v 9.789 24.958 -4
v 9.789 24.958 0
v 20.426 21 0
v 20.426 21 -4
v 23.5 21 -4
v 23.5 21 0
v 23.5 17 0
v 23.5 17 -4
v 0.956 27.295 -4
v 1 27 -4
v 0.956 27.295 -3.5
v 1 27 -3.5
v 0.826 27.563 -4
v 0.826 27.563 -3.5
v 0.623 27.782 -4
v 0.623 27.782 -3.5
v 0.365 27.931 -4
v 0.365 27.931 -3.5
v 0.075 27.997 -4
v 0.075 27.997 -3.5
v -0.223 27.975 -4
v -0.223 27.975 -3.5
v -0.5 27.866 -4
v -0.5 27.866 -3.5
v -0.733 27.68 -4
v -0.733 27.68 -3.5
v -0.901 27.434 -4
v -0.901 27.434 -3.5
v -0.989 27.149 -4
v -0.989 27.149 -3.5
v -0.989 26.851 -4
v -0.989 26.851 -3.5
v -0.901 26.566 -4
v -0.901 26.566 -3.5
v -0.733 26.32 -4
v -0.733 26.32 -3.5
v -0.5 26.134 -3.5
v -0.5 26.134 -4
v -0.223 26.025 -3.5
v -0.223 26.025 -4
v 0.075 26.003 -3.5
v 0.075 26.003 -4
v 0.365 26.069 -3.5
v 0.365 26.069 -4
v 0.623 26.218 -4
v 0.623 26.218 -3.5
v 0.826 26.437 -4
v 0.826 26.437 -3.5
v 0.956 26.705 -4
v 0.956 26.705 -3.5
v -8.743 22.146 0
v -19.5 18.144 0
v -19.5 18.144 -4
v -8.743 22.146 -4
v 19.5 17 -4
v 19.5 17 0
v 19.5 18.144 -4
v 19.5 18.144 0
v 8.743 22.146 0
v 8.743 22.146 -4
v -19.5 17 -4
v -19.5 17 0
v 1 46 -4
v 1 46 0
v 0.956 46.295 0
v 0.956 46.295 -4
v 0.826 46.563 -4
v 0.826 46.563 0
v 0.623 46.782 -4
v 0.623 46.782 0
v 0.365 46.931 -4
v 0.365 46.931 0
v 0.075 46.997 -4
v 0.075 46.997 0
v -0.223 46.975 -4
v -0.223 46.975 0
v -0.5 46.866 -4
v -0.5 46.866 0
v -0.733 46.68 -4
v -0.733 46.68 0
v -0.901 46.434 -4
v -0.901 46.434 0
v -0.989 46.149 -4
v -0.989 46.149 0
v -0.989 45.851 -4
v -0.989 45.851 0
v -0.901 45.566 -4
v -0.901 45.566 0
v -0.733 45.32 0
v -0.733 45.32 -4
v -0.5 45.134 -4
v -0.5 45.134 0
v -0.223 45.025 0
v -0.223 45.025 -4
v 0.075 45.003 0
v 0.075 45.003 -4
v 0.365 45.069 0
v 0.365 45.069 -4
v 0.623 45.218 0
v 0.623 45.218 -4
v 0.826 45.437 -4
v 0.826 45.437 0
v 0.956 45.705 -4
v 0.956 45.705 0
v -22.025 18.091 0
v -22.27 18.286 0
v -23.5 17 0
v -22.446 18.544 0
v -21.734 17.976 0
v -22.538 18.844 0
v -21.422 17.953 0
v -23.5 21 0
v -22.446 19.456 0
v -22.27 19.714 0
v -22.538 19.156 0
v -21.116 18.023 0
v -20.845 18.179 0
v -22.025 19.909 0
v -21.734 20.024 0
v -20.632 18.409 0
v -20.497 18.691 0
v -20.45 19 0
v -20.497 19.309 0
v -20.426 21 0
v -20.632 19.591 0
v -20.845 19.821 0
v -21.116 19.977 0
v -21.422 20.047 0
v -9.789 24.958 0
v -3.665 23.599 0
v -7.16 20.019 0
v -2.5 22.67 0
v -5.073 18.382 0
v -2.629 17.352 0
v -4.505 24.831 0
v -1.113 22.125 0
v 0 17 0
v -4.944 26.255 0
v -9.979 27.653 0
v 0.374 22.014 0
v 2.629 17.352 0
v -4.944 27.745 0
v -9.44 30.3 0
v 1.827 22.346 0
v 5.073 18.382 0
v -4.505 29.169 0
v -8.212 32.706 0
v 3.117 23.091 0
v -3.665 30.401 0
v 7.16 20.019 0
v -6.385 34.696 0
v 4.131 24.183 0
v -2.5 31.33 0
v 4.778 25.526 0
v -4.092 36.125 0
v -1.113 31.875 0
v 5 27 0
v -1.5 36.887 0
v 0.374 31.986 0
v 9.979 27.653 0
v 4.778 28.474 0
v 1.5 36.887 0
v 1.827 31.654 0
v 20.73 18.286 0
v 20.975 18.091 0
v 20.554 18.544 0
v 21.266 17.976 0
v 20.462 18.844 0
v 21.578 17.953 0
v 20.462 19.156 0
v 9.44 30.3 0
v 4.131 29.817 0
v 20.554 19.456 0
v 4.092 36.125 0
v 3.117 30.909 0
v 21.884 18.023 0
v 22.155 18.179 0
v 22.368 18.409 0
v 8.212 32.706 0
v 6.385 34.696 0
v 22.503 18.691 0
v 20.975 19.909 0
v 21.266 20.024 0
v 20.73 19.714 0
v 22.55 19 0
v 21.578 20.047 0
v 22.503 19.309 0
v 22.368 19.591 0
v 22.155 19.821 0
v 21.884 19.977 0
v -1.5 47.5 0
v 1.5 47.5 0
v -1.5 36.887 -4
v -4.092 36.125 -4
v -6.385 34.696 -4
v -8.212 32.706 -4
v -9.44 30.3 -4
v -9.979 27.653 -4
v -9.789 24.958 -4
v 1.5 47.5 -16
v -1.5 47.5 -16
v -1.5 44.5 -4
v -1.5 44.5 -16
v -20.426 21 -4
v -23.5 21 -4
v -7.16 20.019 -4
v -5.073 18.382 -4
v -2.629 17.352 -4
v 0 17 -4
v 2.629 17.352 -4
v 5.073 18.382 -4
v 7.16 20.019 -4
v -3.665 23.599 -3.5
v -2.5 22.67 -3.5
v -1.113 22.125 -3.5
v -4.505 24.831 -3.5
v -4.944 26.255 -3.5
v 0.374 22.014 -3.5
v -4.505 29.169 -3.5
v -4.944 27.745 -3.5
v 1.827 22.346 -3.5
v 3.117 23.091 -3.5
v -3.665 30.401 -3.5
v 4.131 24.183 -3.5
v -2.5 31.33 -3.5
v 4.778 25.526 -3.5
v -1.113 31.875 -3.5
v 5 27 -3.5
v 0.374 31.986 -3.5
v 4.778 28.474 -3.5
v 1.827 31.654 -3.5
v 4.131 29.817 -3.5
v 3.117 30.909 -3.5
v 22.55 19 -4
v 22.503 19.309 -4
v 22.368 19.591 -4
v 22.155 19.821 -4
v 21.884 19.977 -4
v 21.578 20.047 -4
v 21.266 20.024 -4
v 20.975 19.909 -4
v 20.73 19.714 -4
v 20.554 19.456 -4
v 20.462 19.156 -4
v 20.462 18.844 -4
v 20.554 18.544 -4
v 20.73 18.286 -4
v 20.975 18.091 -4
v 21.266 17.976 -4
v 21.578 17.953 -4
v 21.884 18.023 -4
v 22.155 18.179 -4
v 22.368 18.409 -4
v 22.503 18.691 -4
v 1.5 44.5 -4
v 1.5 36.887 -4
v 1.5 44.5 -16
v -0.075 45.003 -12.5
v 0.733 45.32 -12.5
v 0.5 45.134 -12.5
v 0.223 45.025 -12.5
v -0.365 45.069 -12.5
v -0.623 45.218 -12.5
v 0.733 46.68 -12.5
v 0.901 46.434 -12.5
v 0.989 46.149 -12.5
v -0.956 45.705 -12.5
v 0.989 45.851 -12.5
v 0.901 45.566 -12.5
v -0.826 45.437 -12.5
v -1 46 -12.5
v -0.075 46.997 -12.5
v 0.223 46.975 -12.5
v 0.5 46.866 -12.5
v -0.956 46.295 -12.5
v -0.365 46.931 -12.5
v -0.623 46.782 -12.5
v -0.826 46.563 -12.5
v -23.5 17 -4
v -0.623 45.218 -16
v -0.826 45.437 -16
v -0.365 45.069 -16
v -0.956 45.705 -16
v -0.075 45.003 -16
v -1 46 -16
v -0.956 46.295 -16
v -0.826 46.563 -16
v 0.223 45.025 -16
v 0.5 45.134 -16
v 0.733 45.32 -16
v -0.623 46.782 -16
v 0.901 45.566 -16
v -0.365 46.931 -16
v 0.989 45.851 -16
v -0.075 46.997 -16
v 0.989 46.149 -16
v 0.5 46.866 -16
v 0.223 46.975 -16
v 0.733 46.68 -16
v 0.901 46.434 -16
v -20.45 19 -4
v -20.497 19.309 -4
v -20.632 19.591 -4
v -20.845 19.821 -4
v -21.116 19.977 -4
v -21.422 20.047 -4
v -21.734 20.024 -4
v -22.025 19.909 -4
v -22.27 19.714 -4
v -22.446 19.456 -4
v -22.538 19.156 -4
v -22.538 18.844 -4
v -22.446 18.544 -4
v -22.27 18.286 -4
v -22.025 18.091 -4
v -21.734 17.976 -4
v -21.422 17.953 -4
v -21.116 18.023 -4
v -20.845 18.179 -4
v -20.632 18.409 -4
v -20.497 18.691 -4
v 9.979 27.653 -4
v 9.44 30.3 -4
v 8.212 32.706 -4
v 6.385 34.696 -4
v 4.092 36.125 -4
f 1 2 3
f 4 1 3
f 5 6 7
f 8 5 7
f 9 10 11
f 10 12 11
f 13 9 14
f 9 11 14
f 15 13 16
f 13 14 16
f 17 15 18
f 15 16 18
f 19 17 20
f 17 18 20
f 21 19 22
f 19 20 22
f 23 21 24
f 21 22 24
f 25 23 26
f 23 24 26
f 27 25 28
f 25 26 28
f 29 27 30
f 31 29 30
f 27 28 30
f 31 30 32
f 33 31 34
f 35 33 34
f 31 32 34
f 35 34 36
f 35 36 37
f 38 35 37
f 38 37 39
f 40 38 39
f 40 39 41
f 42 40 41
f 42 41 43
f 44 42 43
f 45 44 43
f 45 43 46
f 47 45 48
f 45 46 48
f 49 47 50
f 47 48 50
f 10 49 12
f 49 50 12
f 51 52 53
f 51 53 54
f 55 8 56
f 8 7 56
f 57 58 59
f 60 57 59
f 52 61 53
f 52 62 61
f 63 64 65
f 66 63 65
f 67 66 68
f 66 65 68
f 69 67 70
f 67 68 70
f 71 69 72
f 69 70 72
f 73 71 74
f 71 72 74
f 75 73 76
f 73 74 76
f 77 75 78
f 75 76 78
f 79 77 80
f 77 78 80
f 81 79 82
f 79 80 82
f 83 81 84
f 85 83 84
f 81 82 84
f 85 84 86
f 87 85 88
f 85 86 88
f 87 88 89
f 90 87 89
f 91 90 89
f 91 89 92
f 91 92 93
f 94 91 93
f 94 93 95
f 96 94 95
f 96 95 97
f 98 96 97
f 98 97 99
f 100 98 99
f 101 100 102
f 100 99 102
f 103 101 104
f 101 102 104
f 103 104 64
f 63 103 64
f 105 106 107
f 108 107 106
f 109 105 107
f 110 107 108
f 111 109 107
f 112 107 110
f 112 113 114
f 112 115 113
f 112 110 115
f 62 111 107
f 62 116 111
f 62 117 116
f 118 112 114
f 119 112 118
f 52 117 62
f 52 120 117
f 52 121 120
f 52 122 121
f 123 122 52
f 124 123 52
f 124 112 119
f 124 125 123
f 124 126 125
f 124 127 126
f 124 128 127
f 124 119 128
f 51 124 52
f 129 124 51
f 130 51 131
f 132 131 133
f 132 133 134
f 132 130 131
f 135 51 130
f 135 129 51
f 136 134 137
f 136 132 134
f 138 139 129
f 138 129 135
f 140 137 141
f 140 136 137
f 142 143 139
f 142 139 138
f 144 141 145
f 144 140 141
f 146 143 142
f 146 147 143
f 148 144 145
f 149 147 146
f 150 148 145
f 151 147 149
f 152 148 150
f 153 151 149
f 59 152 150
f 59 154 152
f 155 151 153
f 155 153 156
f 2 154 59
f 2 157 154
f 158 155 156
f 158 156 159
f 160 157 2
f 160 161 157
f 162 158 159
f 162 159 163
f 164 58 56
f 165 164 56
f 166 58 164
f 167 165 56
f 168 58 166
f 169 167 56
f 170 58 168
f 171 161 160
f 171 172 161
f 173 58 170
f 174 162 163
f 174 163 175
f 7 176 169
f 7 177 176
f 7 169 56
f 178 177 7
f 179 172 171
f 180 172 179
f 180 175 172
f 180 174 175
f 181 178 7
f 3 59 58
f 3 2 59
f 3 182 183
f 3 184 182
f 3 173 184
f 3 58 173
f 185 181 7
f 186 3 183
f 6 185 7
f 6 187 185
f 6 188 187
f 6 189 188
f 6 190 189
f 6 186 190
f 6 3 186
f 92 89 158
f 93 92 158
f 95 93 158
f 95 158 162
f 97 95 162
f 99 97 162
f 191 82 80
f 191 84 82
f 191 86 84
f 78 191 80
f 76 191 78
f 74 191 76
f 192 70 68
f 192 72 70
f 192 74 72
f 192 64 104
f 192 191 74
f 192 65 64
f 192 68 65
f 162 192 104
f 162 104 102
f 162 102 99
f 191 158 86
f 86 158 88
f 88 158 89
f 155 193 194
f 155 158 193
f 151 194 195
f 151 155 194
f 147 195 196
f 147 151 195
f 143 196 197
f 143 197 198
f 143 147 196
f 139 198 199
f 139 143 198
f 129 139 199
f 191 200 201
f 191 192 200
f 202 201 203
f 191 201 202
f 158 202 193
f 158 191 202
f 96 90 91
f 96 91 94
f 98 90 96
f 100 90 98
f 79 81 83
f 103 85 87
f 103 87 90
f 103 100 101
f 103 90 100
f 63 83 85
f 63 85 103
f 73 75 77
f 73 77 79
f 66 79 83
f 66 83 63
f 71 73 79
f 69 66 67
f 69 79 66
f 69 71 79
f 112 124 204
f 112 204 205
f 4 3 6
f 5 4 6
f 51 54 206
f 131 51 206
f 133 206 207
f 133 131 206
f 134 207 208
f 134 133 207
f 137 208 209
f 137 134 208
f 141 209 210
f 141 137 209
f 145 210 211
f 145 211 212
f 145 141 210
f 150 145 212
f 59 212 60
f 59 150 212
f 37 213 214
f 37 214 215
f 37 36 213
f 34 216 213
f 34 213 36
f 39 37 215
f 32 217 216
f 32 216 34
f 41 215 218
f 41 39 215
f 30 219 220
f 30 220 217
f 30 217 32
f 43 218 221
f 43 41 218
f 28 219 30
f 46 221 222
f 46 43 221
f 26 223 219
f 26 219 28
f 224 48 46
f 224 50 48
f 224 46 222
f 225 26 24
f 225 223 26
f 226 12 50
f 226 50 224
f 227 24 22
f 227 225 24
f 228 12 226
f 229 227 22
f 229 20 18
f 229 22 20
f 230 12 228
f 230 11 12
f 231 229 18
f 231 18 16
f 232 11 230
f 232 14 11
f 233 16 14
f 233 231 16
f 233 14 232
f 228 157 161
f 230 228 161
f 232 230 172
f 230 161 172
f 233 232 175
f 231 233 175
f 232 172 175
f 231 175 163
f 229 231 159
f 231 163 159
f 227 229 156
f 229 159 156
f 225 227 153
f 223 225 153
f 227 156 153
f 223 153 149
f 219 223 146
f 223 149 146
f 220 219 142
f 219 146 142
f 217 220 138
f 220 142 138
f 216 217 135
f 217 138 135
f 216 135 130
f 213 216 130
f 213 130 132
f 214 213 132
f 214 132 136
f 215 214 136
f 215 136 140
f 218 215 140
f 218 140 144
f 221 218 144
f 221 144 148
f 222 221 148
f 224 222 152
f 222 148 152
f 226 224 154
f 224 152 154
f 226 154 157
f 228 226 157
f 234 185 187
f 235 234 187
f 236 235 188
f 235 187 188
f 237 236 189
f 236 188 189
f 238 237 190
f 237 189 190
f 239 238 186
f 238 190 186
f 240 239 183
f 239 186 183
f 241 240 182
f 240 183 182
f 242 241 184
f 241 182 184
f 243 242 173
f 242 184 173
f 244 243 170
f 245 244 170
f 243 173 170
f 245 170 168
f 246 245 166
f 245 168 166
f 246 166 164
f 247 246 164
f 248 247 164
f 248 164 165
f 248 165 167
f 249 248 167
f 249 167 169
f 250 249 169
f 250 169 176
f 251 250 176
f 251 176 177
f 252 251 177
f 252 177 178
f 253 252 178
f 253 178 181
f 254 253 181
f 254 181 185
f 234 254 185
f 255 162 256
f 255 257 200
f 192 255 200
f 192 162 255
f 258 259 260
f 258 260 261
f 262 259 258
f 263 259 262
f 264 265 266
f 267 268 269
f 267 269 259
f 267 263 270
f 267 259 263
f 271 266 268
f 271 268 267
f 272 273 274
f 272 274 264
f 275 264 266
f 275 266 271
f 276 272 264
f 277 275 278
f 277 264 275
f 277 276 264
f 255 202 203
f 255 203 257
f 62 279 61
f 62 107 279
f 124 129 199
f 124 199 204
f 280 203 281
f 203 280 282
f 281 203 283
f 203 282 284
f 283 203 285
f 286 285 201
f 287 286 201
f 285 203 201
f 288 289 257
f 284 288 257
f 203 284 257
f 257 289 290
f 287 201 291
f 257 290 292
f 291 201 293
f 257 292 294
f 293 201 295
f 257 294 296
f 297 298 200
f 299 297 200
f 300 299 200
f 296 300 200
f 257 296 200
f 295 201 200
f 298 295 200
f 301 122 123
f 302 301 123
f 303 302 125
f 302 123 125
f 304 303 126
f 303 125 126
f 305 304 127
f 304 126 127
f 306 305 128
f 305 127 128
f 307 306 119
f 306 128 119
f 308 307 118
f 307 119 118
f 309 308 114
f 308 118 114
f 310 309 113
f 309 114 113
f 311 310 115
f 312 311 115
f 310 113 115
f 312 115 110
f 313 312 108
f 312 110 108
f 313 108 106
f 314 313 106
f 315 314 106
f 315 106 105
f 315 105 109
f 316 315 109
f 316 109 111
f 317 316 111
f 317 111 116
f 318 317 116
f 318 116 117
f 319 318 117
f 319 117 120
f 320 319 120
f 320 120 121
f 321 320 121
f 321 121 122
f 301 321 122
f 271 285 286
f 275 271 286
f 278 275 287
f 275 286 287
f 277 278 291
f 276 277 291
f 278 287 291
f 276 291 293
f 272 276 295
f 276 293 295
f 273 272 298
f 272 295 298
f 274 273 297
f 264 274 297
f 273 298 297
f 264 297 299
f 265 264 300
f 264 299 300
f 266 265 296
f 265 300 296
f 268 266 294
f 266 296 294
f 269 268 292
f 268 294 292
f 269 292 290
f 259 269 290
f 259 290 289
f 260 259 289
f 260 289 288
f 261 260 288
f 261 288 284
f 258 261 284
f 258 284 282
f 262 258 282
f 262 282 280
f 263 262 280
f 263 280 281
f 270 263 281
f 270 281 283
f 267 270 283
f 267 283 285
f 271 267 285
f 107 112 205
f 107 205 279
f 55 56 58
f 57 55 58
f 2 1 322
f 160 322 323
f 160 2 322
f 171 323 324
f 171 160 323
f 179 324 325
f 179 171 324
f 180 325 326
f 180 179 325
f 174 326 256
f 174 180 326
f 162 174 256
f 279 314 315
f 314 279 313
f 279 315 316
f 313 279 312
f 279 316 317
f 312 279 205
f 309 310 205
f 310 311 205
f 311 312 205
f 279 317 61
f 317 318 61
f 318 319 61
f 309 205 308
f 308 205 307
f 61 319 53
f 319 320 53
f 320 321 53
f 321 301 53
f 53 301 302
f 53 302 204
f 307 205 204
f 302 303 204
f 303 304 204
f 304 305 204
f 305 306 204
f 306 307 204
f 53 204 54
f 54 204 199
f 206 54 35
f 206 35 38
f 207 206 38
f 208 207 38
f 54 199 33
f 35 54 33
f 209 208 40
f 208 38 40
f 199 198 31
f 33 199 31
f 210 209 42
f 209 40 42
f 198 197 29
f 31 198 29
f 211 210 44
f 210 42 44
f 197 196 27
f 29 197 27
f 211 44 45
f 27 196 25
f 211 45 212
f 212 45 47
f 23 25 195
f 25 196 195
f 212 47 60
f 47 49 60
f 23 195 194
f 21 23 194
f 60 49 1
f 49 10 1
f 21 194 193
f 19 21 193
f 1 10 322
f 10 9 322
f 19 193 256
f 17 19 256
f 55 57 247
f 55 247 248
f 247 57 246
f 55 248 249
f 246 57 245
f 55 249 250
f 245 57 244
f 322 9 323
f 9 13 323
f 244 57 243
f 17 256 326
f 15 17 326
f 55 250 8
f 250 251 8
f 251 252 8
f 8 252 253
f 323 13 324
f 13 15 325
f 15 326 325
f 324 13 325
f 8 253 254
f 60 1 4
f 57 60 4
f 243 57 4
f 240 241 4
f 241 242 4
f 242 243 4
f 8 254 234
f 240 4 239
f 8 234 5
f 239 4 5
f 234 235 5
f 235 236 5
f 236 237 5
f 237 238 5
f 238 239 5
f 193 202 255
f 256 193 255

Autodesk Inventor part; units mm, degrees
ref_plane "YZ Plane" through (0, 0, 0) normal (1, 0, 0) x (0, 1, 0)
ref_plane "XZ Plane" through (0, 0, 0) normal (0, 1, 0) x (-1, 0, 0)
ref_plane "XY Plane" through (0, 0, 0) normal (0, 0, 1) x (1, 0, 0)
sketch "スケッチ1" plane through (0, 0, 0) normal (0, 0, 1) x (1, 0, 0)
  circle A0 centre (0, 27) radius 16 construction
  circle A1 centre (0, 46) radius 1
  line L0 (0, 60.4716) -> (0, -64.9114) construction
  circle A2 centre (0, 27) radius 15 construction
  line L1 (1.5, 47.5) -> (-1.5, 47.5)
  line L2 (-1.5, 47.5) -> (-1.5, 44.5)
  line L3 (-1.5, 44.5) -> (1.5, 44.5)
  line L4 (1.5, 44.5) -> (1.5, 47.5)
  line L5 (1.5, 44.5) -> (1.5, 42.9295)
  line L6 (-1.5, 44.5) -> (-1.5, 42.9295)
  circle A3 centre (21.5, 19) radius 1.5 construction
  circle A4 centre (-21.5, 19) radius 1.5 construction
  line L7 (0, 27) -> (21.5, 19) construction
  line L8 (0, 27) -> (-21.5, 19) construction
  circle A5 centre (0, 27) radius 10
  circle A6 centre (0, 27) radius 5
  line L9 (-1.5, 44.5) -> (-1.5, 36.8869)
  line L10 (1.5, 44.5) -> (1.5, 36.8869)
  line L11 (-22.0231, 20.4058) -> (-9.7893, 24.958) construction
  line L12 (-20.9769, 17.5942) -> (-8.7431, 22.1463) construction
  line L13 (22.0231, 20.4058) -> (9.7893, 24.958) construction
  line L14 (20.9769, 17.5942) -> (8.7431, 22.1463) construction
  circle A7 centre (0, 27) radius 1
  circle A8 centre (21.5, 19) radius 1.05
  circle A9 centre (-21.5, 19) radius 1.05
  line L15 (19.5, 21) -> (23.5, 21) construction
  line L16 (23.5, 21) -> (23.5, 17) construction
  line L17 (23.5, 17) -> (19.5, 17) construction
  line L18 (19.5, 17) -> (19.5, 21) construction
  line L19 (19.5, 21) -> (23.5, 17) construction
  line L20 (23.5, 21) -> (19.5, 17) construction
  line L21 (9.7893, 24.958) -> (20.4263, 21)
  line L22 (20.4263, 21) -> (23.5, 21)
  line L23 (23.5, 21) -> (23.5, 17)
  line L24 (23.5, 17) -> (19.5, 17)
  line L25 (19.5, 17) -> (19.5, 18.1437)
  line L26 (19.5, 18.1437) -> (8.7431, 22.1463)
  line L27 (-23.5, 17) -> (-19.5, 17) construction
  line L28 (-19.5, 17) -> (-19.5, 21) construction
  line L29 (-19.5, 21) -> (-23.5, 21) construction
  line L30 (-23.5, 21) -> (-23.5, 17) construction
  line L31 (-23.5, 17) -> (-19.5, 21) construction
  line L32 (-19.5, 17) -> (-23.5, 21) construction
  line L33 (-9.7893, 24.958) -> (-20.4263, 21)
  line L34 (-20.4263, 21) -> (-23.5, 21)
  line L35 (-23.5, 21) -> (-23.5, 17)
  line L36 (-23.5, 17) -> (-19.5, 17)
  line L37 (-19.5, 17) -> (-19.5, 18.1437)
  line L38 (-19.5, 18.1437) -> (-8.7431, 22.1463)
  line L39 (-40.2847, 27) -> (38.7153, 27) construction
  point P0 (0, 0)
  dimension "d0" = 32
  dimension "d1" = 2
  dimension "d3" = 27
  dimension "d4" = 30
  dimension "d5" = 3
  dimension "d6" = 3
  dimension "d8" = 1.5
  dimension "d15" = 20
  dimension "d16" = 10
  dimension "d20" = 2
  dimension "d29" = 27
  dimension "d30" = 27
  dimension "d32" = 3
  dimension "d33" = 3
  dimension "d35" = 2.1
  dimension "d36" = 2.1
  dimension "d40" = 4
  dimension "d41" = 4
  dimension "d42" = 4
  dimension "d43" = 4
  dimension "d48" = 19
  dimension "d49" = 1.5
  dimension "d50" = 21.5
  dimension "d51" = 21.5
extrude "押し出し1" add sketch "スケッチ1" against normal blind 16 contours A1 | L4 L3 L2 L1
extrude "押し出し3" cut sketch "スケッチ1" against normal blind 4 contours A1
sketch "スケッチ6" plane through (0, 0, 0) normal (0, 0, 1) x (1, 0, 0)
  circle A0 centre (0, 27) radius 5 projected
  circle A1 centre (0, 27) radius 5
  point P0 (0, 0)
  dimension "d23" = 10
sketch "スケッチ7" plane through (0, 0, -16) normal (0, 0, -1) x (-1, 0, 0)
  circle A0 centre (0, 46) radius 1 projected
  point P0 (0, 0)
extrude "押し出し7" cut sketch "スケッチ7" against normal blind 3.5
extrude "押し出し9" add sketch "スケッチ1" against normal blind 4 contours L5 L10 A5 L9 L6 L3 | A5 | A5 L38 L37 L36 L35 L34 L33 | L21 L22 L23 L24 L25 L26 A5 | A6
extrude "押し出し10" cut sketch "スケッチ6" against normal blind 3.5
sketch "スケッチ8" plane through (0, 0, 0) normal (0, 0, 1) x (1, 0, 0)
  circle A0 centre (0, 27) radius 5 projected
  circle A1 centre (21.5, 19) radius 1.05 projected
  circle A2 centre (-21.5, 19) radius 1.05 projected
  circle A3 centre (0, 46) radius 1 projected
  line L0 (1.5, 47.5) -> (-1.5, 47.5) projected
  line L1 (-1.5, 47.5) -> (-1.5, 36.8869) projected
  arc A4 (-1.5, 36.8869) -> (-9.7893, 24.958) centre (0, 27) ccw projected
  line L2 (-9.7893, 24.958) -> (-20.4263, 21) projected
  line L3 (-20.4263, 21) -> (-23.5, 21) projected
  line L4 (-23.5, 21) -> (-23.5, 17) projected
  line L5 (-23.5, 17) -> (-19.5, 17) projected
  line L6 (-19.5, 17) -> (-19.5, 18.1437) projected
  line L7 (-19.5, 18.1437) -> (-8.7431, 22.1463) projected
  arc A5 (-8.7431, 22.1463) -> (8.7431, 22.1463) centre (0, 27) ccw projected
  line L8 (8.7431, 22.1463) -> (19.5, 18.1437) projected
  line L9 (19.5, 18.1437) -> (19.5, 17) projected
  line L10 (19.5, 17) -> (23.5, 17) projected
  line L11 (23.5, 17) -> (23.5, 21) projected
  line L12 (23.5, 21) -> (20.4263, 21) projected
  line L13 (20.4263, 21) -> (9.7893, 24.958) projected
  arc A6 (9.7893, 24.958) -> (1.5, 36.8869) centre (0, 27) ccw projected
  line L14 (1.5, 36.8869) -> (1.5, 47.5) projected
  circle A7 centre (0, 27) radius 1 projected
  point P0 (0, 0)
equation "\"d30\" = d29"
equation "\"d33\" = d32"
equation "\"d36\" = d35"
equation "\"d41\" = d40"
equation "\"d42\" = d40"
equation "\"d43\" = d40"
equation "\"d51\" = d50"
properties part number "s_mount"
